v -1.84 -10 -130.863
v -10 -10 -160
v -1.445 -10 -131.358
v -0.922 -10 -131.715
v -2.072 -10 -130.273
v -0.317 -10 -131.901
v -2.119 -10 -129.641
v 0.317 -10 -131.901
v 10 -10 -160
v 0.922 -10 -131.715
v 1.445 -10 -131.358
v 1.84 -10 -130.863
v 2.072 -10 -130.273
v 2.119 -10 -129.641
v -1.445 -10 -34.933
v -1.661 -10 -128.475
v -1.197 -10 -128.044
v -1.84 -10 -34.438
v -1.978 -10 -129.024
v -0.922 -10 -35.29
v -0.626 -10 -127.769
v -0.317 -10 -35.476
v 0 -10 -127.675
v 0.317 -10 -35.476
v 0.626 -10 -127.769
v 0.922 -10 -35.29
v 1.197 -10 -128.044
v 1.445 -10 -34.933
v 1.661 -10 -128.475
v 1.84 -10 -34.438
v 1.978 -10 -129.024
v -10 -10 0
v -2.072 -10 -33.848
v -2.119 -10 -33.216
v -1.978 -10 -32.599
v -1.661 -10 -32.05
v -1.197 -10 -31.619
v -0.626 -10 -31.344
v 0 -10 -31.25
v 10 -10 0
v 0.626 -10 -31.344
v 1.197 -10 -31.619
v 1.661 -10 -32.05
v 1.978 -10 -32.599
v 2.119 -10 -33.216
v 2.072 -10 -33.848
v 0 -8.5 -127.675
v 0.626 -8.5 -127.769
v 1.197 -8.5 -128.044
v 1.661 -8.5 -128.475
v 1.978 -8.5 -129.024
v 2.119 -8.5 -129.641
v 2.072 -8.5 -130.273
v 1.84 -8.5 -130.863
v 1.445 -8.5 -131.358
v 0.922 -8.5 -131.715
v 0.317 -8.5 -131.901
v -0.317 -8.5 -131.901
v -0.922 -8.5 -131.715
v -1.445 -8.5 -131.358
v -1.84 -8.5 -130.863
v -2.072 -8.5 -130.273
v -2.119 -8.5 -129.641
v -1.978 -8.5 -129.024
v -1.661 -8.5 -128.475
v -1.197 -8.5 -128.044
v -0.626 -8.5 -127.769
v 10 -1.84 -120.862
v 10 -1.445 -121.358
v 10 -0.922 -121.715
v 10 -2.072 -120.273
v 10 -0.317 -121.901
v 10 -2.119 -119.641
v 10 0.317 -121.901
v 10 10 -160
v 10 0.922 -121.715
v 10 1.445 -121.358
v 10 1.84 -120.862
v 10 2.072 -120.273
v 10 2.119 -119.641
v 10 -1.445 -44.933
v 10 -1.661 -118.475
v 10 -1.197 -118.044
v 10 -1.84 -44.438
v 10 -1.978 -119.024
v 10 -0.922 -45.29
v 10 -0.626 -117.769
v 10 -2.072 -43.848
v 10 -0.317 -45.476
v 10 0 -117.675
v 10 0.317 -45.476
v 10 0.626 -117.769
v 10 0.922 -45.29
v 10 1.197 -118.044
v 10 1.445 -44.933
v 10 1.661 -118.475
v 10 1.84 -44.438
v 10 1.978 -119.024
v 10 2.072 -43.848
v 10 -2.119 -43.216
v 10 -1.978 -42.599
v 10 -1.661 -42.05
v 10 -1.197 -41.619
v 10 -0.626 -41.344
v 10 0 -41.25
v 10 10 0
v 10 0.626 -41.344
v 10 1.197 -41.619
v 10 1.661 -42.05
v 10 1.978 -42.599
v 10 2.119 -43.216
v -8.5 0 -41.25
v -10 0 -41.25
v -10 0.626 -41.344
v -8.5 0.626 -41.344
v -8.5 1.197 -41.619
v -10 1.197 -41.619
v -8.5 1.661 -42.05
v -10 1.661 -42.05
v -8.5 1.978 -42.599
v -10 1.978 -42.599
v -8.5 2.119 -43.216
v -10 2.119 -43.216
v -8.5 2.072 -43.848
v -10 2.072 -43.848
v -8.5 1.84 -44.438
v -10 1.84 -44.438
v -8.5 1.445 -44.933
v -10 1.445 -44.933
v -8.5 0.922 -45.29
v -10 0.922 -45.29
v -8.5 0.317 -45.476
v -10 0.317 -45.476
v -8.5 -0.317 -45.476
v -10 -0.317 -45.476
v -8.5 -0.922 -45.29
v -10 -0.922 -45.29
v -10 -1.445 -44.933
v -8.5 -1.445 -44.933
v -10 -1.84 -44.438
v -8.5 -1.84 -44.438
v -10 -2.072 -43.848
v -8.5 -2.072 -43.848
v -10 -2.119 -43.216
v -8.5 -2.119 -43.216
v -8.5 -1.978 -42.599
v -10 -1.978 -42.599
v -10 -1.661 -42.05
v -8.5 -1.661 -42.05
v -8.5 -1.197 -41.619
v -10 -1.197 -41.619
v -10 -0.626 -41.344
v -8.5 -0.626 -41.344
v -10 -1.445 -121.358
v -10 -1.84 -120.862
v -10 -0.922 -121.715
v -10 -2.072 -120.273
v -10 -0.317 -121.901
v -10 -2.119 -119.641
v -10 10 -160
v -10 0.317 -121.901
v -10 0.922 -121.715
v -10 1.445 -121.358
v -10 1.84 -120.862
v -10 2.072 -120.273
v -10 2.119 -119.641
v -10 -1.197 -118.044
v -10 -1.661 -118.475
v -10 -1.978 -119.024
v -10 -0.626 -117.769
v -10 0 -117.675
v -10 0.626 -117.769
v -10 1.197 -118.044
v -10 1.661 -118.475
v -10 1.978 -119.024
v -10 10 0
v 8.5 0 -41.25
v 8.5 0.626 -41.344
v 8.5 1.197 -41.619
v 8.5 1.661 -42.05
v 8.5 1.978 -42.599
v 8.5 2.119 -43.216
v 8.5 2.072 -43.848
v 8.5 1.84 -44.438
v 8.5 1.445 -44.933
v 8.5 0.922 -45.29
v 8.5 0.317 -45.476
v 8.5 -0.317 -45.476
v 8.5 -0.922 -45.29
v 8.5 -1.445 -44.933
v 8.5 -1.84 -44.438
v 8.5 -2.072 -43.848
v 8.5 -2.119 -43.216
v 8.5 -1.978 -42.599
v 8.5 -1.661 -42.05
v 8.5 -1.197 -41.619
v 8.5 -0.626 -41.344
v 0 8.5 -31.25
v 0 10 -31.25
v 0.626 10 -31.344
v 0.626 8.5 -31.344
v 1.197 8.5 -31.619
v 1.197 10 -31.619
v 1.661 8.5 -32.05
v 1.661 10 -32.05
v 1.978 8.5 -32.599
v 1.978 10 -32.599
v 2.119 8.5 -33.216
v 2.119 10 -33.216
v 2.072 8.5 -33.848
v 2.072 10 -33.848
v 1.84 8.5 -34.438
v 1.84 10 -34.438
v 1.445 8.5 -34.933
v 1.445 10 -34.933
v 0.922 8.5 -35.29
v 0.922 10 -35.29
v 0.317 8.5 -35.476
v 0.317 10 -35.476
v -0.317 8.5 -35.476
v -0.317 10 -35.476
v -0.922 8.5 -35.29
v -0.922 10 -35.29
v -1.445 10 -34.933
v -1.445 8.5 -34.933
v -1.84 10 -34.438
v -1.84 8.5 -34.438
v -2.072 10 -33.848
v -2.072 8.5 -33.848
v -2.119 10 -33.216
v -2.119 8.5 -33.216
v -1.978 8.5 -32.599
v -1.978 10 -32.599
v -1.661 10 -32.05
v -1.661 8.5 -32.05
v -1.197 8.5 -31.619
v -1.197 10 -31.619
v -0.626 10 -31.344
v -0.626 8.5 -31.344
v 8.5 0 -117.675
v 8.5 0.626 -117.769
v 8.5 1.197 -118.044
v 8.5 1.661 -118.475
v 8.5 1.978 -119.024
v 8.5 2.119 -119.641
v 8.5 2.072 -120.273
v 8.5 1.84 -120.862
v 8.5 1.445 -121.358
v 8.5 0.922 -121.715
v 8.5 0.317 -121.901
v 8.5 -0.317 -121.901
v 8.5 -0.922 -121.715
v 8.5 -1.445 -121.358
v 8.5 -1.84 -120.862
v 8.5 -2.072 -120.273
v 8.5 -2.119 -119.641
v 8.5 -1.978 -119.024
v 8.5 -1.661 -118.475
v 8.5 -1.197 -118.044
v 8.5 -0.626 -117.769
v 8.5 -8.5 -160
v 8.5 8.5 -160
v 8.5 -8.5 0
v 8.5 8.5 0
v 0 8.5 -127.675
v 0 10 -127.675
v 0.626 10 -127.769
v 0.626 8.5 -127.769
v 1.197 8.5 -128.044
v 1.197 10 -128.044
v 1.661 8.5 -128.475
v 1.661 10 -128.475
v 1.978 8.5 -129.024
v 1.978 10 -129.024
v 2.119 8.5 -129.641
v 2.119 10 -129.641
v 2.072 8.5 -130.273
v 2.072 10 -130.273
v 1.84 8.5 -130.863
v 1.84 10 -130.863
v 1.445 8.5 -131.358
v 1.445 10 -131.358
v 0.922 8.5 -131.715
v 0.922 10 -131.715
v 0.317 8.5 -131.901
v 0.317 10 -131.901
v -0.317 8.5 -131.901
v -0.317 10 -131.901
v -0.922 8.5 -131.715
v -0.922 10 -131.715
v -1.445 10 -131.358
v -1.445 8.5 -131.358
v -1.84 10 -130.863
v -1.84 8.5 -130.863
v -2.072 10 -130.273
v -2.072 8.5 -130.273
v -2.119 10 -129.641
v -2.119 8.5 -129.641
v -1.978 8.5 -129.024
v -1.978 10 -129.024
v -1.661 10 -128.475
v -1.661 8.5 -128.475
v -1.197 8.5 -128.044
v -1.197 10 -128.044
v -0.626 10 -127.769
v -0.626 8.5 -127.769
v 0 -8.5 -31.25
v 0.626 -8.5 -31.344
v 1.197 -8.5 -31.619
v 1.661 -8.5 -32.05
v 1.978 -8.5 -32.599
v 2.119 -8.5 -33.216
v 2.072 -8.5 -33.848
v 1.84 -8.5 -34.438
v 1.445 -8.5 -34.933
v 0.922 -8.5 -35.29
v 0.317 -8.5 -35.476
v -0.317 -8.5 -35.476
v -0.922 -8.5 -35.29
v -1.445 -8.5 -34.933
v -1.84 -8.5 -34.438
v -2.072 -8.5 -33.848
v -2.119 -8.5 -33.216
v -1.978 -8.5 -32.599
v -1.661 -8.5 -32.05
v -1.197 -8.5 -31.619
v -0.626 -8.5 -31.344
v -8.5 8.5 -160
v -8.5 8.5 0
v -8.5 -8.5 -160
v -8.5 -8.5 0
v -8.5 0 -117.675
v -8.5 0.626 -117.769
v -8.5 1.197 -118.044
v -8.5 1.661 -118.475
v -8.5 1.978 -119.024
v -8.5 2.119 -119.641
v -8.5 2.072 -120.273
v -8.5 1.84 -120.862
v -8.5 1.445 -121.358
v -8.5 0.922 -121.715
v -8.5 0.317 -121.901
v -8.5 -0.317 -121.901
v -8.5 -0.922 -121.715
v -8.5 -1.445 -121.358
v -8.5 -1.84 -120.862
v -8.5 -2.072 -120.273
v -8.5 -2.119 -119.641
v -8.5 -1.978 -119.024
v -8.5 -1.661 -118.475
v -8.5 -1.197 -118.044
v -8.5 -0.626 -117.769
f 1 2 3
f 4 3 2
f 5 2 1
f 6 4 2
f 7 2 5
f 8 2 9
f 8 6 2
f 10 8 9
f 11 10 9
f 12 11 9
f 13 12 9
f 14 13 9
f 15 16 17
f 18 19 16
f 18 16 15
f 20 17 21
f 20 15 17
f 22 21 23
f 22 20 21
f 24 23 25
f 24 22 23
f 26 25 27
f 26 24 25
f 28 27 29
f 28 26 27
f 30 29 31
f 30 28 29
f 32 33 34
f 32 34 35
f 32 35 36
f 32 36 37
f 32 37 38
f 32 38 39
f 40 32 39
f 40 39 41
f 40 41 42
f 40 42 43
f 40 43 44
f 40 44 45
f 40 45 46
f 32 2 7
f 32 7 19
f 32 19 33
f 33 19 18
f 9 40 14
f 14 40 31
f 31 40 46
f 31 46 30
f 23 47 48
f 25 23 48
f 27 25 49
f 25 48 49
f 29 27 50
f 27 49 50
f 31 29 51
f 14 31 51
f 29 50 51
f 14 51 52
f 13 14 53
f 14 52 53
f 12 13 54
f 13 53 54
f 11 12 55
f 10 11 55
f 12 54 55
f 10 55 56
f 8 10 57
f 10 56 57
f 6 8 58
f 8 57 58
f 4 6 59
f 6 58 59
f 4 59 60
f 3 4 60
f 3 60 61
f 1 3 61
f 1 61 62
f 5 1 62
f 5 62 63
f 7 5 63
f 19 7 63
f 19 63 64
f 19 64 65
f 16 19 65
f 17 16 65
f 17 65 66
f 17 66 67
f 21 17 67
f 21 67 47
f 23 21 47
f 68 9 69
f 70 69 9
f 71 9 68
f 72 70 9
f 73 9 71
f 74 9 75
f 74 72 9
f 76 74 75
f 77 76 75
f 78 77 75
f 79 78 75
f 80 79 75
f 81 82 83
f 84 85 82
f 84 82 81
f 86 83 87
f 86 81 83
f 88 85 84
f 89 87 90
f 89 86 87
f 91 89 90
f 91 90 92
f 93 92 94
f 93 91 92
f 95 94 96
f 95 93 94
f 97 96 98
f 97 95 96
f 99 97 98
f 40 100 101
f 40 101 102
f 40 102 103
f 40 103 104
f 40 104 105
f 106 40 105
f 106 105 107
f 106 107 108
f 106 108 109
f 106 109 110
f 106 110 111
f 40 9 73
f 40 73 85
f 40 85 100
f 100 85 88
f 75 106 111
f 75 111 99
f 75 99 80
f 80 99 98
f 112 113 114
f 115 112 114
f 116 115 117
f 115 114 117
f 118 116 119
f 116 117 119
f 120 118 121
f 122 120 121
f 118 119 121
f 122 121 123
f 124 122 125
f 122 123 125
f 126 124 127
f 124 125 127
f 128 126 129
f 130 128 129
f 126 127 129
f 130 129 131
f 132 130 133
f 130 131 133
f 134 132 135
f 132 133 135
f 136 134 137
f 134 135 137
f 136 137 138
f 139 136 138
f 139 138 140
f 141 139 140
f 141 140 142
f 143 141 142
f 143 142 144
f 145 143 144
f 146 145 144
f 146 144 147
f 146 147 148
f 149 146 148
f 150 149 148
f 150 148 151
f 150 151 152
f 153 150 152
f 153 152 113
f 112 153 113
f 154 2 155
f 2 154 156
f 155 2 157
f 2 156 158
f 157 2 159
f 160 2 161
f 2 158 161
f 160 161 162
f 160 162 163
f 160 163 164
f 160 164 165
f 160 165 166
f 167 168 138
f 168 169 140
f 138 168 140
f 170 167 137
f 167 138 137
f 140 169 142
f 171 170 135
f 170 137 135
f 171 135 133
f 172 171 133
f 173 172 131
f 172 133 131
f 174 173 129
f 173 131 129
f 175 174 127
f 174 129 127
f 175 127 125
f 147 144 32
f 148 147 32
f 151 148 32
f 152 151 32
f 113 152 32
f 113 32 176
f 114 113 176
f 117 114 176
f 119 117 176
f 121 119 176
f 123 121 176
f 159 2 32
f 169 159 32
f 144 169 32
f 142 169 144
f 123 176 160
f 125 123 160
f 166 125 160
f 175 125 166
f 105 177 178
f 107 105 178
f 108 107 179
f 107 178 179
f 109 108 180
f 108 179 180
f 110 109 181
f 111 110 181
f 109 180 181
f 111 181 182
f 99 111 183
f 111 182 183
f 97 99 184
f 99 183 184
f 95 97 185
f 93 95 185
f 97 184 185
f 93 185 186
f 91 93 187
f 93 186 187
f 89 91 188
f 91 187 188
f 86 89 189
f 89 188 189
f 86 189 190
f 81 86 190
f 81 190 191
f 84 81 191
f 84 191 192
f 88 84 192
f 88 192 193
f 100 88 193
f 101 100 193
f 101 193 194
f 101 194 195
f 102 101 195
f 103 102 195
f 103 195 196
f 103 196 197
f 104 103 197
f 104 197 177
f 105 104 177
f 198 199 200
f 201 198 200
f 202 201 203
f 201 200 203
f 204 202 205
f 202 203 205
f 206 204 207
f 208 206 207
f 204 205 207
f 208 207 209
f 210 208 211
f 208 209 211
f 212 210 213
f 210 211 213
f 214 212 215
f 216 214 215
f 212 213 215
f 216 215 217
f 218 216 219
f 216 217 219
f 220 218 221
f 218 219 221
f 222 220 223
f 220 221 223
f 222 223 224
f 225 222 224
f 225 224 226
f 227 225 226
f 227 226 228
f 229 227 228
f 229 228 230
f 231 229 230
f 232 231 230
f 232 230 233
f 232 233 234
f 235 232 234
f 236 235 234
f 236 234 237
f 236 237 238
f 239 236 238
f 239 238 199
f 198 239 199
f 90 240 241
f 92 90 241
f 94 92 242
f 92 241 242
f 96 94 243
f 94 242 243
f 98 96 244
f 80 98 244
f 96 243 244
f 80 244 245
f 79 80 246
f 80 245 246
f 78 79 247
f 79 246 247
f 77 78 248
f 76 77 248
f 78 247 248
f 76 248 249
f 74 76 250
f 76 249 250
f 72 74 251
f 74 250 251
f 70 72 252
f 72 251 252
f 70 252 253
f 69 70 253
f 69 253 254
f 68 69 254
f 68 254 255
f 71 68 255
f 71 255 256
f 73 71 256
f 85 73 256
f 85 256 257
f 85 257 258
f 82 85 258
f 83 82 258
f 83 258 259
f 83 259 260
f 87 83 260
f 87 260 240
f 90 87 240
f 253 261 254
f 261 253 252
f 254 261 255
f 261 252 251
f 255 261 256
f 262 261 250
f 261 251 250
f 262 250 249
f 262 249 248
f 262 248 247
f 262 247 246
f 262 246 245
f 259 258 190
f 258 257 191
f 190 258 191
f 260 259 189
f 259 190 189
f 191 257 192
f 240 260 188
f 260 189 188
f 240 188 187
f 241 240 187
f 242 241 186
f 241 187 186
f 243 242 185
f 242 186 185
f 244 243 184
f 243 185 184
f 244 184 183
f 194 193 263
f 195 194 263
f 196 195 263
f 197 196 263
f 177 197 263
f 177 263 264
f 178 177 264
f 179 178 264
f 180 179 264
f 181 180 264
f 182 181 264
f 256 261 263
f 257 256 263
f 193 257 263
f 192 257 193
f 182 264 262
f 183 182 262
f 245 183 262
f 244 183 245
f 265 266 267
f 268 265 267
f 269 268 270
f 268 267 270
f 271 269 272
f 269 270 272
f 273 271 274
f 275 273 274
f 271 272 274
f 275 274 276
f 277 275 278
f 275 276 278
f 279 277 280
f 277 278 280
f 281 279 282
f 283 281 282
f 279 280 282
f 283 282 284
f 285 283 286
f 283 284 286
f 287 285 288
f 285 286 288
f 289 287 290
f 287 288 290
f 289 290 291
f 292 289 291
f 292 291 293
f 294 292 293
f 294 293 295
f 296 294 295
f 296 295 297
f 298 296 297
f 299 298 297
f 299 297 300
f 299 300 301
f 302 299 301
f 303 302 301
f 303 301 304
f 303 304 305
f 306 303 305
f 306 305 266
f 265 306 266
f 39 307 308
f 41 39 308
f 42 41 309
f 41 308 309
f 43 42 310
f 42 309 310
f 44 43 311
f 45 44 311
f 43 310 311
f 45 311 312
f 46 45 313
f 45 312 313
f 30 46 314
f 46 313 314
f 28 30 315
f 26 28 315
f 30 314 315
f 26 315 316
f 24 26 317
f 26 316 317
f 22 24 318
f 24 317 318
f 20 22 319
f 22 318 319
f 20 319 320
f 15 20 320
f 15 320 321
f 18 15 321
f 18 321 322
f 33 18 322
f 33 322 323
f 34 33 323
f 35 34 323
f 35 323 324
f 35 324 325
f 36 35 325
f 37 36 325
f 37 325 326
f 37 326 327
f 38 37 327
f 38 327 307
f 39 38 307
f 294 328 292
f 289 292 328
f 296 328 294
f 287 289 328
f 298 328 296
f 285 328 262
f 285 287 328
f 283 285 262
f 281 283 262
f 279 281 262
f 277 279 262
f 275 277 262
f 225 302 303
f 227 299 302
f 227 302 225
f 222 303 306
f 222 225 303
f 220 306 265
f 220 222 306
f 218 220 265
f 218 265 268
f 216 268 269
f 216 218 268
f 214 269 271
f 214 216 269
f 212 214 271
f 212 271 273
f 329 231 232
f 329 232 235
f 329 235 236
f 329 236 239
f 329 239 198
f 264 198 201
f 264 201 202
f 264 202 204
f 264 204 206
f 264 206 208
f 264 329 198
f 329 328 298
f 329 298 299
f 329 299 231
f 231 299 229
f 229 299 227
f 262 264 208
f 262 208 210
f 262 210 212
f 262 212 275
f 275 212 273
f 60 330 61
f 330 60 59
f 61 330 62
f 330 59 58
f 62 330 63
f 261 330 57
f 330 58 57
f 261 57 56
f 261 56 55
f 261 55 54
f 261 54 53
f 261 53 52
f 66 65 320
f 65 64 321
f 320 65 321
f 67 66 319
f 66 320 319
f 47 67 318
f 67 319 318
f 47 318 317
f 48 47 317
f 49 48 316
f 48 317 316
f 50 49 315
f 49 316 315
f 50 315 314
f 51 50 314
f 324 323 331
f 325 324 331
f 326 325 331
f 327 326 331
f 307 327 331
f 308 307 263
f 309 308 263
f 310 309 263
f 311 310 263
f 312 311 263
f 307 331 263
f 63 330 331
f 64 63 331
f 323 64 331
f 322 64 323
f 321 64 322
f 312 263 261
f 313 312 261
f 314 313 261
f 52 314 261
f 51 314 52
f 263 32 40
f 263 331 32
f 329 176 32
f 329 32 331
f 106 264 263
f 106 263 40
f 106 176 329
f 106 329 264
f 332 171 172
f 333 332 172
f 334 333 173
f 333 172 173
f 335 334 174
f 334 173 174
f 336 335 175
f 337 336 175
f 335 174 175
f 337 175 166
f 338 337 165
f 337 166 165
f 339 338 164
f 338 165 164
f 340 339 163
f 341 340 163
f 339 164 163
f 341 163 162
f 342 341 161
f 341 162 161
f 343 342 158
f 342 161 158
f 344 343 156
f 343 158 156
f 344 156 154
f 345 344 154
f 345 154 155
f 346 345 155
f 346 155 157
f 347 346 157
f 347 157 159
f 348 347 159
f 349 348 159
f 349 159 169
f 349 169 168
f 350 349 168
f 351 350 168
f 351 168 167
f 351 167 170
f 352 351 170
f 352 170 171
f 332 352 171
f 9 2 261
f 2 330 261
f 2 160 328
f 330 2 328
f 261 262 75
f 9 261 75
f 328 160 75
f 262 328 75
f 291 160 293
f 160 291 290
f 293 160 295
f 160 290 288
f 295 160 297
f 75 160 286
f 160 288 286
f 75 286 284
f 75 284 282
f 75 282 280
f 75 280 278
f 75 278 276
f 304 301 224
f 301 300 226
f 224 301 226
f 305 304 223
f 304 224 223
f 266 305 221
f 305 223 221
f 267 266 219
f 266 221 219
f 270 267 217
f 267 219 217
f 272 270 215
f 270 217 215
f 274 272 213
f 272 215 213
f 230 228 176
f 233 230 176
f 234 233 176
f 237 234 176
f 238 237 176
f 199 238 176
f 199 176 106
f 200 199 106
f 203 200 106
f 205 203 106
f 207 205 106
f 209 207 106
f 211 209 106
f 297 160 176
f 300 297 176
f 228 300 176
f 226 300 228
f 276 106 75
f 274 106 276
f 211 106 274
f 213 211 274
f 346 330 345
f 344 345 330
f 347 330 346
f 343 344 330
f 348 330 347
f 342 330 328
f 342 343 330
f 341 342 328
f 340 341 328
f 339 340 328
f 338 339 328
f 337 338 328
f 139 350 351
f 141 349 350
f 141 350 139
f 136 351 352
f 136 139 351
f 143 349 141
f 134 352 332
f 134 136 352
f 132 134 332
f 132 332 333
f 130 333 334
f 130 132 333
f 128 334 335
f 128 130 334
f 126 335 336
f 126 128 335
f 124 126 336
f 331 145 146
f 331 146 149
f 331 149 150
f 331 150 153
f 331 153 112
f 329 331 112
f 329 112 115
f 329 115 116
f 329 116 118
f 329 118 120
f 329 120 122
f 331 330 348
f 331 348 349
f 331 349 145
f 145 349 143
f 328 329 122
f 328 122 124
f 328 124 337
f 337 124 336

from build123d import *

# Parameters (mm, degrees)
SKETCH1_W           = 20
SKETCH1_H           = 20
SKETCH1_W_2         = 17
SKETCH1_H_2         = 17
BOSS_EXTRUDE1_DEPTH = 160
SKETCH2_R           = 2.125
CUT_EXTRUDE1_DEPTH  = 162.554944214
SKETCH3_R           = 2.125
CUT_EXTRUDE2_DEPTH  = 162.554944214


with BuildPart() as part:
    # Sketch1 → Boss-Extrude1 (new body)
    with BuildSketch(Plane.XY):
        Rectangle(SKETCH1_W, SKETCH1_H)
        Rectangle(SKETCH1_W_2, SKETCH1_H_2, mode=Mode.SUBTRACT)
    extrude(amount=-BOSS_EXTRUDE1_DEPTH)

    # Sketch2 → Cut-Extrude1 (cut, through all)
    with BuildSketch(Plane(origin=(0, 10, 0), x_dir=(1, 0, 0), z_dir=(0, 1, 0))):
        with Locations(Location((0, 33.375, 0), (0, 0, 270))):
            Circle(SKETCH2_R)
        with Locations(Location((0, 129.8, 0), (0, 0, 270))):
            Circle(SKETCH2_R)
    extrude(amount=-CUT_EXTRUDE1_DEPTH, mode=Mode.SUBTRACT)

    # Sketch3 → Cut-Extrude2 (cut, through all)
    with BuildSketch(Plane.ZY.offset(10)):
        with Locations((-43.375, 0)):
            Circle(SKETCH3_R)
        with Locations((-119.8, 0)):
            Circle(SKETCH3_R)
    extrude(amount=-CUT_EXTRUDE2_DEPTH, mode=Mode.SUBTRACT)


solid = part.part
